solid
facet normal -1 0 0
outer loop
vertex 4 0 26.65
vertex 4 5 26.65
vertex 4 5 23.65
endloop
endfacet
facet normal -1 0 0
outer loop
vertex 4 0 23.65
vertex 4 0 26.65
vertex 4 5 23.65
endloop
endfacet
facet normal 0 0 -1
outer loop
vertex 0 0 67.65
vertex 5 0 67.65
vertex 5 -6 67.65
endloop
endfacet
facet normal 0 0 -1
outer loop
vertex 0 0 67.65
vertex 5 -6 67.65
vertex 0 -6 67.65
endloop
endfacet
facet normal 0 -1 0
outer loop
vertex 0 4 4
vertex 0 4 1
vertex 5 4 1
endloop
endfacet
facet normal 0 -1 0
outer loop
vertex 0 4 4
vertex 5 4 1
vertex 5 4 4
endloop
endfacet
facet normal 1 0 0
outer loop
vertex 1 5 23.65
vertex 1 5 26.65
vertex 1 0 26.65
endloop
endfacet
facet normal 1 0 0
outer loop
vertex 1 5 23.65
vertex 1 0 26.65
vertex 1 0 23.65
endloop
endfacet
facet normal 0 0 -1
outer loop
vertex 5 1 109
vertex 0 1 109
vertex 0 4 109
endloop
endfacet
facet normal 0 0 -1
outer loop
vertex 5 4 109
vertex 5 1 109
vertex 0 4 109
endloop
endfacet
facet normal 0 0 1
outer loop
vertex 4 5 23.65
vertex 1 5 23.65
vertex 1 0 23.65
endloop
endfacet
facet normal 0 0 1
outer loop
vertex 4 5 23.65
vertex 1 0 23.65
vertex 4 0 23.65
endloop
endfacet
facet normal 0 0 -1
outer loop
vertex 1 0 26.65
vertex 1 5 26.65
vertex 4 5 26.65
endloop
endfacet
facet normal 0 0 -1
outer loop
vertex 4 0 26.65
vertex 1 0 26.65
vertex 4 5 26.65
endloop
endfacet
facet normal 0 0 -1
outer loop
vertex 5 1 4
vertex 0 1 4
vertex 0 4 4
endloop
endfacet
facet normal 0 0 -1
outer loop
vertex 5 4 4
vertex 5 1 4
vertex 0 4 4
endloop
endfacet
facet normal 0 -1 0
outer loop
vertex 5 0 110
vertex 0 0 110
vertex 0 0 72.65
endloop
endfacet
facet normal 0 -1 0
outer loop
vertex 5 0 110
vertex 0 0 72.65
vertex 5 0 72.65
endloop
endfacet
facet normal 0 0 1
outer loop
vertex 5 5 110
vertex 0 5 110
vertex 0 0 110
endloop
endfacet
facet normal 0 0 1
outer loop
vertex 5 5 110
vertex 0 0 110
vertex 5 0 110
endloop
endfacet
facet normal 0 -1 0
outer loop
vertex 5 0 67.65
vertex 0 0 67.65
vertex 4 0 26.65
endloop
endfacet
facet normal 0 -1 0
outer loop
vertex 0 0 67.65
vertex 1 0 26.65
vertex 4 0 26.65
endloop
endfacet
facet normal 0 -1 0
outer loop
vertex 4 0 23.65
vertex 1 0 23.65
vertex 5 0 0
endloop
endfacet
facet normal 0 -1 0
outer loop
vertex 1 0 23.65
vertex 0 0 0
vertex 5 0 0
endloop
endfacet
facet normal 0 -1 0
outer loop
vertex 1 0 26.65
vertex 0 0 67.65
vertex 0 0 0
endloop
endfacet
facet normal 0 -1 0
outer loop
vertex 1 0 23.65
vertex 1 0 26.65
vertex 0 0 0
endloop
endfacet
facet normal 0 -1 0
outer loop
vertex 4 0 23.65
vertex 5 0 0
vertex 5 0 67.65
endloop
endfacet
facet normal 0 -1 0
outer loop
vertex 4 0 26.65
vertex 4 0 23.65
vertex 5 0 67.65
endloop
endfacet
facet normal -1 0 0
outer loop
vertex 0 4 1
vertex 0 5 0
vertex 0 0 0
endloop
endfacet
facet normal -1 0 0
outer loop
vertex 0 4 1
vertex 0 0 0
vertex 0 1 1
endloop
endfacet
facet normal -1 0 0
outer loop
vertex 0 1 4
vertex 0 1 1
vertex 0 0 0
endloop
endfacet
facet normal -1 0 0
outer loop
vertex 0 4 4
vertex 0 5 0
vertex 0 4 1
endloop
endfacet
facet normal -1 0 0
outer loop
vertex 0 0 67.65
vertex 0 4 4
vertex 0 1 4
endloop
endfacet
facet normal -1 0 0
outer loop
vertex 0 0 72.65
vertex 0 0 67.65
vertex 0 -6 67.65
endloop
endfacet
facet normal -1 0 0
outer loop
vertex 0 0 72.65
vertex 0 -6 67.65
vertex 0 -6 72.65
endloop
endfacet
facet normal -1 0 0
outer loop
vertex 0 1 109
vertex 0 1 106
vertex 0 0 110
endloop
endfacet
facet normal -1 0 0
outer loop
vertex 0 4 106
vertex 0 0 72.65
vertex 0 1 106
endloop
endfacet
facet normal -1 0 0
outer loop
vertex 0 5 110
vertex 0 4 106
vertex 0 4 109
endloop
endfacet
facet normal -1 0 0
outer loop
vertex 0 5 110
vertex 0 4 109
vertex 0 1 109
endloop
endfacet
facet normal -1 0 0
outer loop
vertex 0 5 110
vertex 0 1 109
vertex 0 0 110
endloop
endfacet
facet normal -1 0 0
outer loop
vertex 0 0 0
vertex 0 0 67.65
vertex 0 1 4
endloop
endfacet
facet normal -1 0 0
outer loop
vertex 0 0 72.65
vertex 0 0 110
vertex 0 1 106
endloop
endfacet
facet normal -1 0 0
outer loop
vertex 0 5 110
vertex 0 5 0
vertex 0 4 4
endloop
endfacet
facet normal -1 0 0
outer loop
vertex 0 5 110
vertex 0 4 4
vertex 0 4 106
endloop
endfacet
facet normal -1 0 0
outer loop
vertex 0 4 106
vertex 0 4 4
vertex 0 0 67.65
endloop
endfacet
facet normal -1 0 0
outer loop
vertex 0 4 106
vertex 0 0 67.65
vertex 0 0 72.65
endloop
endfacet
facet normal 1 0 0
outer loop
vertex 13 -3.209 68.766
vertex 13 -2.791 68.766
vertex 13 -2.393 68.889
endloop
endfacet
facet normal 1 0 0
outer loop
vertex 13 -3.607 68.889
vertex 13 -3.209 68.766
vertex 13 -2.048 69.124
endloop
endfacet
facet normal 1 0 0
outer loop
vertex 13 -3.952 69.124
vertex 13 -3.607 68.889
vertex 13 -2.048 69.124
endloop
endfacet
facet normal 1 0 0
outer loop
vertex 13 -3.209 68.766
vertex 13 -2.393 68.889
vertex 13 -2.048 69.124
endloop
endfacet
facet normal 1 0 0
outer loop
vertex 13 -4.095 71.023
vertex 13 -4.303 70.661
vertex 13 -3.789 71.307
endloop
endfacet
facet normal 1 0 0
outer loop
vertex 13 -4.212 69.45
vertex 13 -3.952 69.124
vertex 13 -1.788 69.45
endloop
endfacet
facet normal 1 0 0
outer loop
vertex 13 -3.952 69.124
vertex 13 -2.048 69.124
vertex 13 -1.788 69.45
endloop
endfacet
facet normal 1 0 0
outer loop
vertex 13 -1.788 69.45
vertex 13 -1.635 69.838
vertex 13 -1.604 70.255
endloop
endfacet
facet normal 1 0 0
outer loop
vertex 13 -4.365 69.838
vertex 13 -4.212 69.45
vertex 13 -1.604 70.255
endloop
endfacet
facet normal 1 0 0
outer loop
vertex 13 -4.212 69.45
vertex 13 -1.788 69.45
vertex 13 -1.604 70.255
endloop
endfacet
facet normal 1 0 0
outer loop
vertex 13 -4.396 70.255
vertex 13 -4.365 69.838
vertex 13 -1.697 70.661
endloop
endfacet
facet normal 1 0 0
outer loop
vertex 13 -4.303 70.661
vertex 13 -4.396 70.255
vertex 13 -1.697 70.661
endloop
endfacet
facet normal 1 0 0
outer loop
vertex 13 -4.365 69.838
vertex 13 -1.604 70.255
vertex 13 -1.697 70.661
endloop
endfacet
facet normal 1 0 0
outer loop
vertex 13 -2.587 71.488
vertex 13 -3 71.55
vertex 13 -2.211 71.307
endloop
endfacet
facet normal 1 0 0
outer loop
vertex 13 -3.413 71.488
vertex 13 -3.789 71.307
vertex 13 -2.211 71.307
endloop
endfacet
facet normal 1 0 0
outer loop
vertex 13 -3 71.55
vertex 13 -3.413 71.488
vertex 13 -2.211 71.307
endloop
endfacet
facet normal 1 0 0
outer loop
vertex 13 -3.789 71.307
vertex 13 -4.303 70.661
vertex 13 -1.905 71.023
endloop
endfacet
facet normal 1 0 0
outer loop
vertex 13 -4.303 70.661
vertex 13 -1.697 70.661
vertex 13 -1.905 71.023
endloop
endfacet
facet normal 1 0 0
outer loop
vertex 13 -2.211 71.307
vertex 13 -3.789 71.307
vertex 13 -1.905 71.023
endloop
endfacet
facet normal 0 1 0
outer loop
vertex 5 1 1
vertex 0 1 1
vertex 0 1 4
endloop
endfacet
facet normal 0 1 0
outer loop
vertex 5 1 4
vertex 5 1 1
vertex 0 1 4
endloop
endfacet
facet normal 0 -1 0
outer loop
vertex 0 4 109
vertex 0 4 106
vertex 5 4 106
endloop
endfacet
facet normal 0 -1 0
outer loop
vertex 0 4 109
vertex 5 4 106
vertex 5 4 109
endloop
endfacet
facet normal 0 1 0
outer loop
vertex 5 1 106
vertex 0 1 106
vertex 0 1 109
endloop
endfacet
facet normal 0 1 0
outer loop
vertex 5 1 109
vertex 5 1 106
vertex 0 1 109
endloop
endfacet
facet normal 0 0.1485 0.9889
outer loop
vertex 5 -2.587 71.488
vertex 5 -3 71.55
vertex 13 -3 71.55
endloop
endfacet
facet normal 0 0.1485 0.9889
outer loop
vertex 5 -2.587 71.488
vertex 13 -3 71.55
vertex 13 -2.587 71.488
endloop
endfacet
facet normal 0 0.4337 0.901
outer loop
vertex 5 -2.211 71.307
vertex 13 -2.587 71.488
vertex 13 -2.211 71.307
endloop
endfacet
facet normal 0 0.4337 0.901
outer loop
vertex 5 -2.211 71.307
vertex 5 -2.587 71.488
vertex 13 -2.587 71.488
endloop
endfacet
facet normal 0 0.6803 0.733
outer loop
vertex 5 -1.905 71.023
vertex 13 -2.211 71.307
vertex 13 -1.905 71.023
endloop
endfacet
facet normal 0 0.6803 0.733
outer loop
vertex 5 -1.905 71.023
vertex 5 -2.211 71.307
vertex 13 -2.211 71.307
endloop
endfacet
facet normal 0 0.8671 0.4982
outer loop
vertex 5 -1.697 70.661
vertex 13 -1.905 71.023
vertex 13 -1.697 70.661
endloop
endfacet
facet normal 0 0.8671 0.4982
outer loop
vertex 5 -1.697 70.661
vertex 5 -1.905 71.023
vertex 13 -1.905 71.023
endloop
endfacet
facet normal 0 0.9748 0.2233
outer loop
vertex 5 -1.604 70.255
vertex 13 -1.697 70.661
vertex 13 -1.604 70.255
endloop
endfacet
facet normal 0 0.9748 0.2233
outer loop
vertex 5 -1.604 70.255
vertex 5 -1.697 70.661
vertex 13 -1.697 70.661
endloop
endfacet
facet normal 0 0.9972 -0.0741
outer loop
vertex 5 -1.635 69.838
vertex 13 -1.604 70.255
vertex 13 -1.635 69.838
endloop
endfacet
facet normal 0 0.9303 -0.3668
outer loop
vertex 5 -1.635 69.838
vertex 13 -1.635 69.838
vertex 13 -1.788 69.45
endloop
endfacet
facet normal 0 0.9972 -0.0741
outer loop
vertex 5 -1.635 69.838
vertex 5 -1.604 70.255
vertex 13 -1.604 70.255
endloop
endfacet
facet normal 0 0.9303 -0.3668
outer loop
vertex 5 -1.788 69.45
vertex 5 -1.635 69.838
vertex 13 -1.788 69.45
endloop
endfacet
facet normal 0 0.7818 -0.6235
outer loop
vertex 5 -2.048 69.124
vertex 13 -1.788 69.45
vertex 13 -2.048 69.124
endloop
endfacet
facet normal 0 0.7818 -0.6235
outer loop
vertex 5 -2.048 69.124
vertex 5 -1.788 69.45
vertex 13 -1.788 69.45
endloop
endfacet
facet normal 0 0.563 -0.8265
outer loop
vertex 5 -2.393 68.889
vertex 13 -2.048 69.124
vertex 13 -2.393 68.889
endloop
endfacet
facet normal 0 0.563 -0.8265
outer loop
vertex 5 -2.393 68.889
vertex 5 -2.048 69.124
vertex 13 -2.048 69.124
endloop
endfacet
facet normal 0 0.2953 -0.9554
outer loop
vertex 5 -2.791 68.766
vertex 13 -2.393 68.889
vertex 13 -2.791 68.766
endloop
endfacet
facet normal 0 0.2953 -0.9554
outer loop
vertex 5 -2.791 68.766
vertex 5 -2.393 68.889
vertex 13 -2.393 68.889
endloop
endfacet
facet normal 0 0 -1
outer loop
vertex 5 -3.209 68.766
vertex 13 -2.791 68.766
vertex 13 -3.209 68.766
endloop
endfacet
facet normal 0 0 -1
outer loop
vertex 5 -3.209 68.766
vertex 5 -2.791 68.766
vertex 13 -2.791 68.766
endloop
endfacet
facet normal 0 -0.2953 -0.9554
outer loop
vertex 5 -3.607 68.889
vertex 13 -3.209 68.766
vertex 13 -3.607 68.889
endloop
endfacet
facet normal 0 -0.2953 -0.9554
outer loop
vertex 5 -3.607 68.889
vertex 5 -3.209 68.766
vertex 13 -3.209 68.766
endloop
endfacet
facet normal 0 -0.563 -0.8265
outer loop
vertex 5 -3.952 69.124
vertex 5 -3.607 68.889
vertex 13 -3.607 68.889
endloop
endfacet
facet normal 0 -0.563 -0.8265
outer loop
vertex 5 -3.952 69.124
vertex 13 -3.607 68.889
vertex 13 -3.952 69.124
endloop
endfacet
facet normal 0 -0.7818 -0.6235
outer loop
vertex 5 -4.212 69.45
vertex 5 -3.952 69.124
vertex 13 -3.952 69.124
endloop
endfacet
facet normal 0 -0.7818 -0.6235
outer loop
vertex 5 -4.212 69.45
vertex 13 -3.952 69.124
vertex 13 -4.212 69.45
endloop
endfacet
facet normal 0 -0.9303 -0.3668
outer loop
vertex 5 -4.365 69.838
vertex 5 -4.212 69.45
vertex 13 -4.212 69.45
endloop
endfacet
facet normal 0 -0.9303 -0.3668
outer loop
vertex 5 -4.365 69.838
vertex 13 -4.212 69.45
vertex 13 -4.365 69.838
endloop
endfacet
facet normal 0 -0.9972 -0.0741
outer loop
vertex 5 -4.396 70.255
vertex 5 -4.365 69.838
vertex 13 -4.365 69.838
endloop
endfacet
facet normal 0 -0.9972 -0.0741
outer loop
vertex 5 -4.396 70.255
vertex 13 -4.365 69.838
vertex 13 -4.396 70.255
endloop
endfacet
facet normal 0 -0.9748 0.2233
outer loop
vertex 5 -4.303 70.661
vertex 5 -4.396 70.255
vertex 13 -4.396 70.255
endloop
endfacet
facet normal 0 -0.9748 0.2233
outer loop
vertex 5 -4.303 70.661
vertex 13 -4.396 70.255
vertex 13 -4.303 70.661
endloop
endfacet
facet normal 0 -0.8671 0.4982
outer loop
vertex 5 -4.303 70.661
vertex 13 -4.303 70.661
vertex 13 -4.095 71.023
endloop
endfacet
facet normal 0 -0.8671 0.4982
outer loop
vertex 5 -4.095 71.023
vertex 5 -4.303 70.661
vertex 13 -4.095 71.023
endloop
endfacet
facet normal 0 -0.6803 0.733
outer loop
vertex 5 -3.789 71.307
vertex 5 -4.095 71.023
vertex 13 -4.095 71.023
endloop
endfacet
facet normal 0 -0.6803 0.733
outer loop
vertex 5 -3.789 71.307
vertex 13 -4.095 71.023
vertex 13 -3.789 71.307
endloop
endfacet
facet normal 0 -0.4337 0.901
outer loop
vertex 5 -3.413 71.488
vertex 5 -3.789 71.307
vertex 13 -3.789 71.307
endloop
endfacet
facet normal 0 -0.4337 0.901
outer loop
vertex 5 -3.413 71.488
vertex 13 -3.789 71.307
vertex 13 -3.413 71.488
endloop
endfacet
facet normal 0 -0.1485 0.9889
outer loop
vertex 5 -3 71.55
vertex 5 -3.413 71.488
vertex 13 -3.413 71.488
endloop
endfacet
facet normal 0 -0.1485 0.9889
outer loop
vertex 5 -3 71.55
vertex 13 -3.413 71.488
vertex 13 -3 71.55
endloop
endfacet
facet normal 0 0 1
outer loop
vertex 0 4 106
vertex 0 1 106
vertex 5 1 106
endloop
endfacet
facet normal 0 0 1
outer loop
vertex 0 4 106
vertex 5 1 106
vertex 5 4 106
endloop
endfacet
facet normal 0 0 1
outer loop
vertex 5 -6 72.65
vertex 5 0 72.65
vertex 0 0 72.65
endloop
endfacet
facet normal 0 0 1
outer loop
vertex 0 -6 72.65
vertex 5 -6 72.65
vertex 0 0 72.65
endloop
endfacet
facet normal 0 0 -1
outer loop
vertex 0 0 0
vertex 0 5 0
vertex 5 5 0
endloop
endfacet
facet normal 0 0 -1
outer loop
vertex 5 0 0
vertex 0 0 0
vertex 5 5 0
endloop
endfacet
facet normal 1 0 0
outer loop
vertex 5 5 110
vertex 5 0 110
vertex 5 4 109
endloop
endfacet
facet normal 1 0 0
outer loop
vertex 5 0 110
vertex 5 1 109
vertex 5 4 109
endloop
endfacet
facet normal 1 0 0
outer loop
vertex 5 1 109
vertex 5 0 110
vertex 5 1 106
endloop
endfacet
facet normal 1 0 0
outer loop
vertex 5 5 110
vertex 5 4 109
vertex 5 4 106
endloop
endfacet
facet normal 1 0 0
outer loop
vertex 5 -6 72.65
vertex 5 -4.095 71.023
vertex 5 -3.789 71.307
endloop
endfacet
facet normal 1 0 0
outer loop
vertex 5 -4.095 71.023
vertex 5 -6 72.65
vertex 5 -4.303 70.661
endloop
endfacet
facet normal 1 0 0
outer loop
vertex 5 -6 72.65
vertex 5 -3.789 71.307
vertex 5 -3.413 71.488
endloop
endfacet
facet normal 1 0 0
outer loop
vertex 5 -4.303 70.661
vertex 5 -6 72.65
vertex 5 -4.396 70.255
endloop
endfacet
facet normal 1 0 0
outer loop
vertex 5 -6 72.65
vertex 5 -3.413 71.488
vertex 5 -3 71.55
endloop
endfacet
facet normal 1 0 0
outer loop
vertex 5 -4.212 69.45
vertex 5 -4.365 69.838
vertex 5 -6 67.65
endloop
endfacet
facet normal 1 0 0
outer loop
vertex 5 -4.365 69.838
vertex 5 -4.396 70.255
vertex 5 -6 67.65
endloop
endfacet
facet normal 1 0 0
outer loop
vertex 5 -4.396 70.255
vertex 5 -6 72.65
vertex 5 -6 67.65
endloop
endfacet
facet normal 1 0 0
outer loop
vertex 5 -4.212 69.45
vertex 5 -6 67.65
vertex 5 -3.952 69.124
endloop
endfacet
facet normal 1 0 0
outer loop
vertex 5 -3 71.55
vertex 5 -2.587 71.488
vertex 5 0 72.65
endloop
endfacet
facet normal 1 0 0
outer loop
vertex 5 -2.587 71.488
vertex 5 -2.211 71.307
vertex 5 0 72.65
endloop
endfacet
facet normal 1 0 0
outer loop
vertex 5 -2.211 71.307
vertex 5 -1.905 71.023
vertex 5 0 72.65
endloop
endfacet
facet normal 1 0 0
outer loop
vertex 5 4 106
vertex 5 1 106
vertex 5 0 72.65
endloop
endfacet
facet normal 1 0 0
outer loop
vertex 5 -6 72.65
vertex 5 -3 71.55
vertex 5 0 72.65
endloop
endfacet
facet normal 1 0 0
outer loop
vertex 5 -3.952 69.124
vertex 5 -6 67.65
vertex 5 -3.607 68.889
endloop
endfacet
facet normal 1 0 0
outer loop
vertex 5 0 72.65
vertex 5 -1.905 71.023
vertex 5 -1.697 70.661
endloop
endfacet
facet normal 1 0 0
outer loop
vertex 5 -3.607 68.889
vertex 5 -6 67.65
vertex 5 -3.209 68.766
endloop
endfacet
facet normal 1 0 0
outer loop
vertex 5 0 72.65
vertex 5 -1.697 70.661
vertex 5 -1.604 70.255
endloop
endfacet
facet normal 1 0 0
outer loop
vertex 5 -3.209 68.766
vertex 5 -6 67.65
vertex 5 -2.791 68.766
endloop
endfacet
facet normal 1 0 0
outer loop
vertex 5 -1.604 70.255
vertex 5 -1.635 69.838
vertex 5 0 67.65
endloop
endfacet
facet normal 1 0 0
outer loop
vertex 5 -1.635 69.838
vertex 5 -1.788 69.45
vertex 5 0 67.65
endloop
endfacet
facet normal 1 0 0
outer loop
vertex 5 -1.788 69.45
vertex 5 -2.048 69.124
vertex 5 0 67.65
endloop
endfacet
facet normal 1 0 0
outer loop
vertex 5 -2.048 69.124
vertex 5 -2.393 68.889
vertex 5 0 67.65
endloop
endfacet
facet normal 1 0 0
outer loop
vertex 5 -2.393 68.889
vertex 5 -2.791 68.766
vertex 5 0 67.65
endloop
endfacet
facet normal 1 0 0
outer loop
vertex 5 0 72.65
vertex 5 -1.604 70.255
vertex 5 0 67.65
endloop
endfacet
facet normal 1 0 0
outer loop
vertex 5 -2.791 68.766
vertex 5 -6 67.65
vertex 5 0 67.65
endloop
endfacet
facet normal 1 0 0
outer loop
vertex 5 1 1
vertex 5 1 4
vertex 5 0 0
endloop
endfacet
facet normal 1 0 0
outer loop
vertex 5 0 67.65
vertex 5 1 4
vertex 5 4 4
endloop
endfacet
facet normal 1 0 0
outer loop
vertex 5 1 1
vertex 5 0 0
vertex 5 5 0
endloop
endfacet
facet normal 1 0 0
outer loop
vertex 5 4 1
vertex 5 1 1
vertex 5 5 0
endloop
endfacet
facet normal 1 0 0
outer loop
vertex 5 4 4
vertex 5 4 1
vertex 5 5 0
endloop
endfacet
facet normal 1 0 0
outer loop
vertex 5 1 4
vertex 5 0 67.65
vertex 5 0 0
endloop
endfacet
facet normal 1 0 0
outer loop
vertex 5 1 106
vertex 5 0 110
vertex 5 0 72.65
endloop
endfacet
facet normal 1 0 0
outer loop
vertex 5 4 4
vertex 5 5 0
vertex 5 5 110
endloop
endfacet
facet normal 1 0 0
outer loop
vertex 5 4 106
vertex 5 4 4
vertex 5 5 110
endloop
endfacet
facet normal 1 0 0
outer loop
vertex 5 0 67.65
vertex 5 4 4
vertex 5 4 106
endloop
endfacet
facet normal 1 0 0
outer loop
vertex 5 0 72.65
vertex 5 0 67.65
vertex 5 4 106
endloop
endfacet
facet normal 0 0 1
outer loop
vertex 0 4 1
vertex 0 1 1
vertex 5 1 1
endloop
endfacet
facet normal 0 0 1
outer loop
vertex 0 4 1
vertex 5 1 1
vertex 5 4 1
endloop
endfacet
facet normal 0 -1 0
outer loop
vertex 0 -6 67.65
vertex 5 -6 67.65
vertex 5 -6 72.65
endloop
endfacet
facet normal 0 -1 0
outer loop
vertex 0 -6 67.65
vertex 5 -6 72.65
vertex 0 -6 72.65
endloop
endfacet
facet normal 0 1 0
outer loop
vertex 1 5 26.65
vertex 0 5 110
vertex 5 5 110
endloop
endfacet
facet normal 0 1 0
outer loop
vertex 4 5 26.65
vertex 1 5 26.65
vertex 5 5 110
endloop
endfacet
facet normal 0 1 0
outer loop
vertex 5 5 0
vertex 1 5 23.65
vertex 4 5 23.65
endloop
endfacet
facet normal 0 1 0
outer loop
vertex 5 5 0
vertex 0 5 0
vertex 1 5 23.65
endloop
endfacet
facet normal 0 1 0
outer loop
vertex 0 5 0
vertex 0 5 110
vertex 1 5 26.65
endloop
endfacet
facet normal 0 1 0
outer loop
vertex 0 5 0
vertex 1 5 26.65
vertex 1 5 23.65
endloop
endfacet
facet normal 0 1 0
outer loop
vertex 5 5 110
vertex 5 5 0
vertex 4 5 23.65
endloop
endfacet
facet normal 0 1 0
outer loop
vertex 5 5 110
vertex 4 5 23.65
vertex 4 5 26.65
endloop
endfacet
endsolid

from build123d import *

# Parameters (mm, degrees)
SKETCH1_W           = 5
SKETCH1_H           = 5
BOSS_EXTRUDE1_DEPTH = 110
SKETCH2_W           = 3
SKETCH2_H           = 3
CUT_EXTRUDE1_DEPTH  = 9
SKETCH3_W           = 3
SKETCH3_H           = 3
CUT_EXTRUDE2_DEPTH  = 9
SKETCH4_W           = 5
SKETCH4_H           = 5
BOSS_EXTRUDE2_DEPTH = 6
SKETCH5_R           = 1.4
BOSS_EXTRUDE3_DEPTH = 13


with BuildPart() as part:
    # Sketch1 → Boss-Extrude1 (new body)
    with BuildSketch(Plane.XY):
        with Locations((2.5, 2.5)):
            Rectangle(SKETCH1_W, SKETCH1_H)
    extrude(amount=BOSS_EXTRUDE1_DEPTH)

    # Sketch2 → Cut-Extrude1 (cut)
    with BuildSketch(Plane.ZY):
        with Locations((2.5, 2.5)):
            Rectangle(SKETCH2_W, SKETCH2_H)
        with Locations((107.5, 2.5)):
            Rectangle(SKETCH2_W, SKETCH2_H)
    extrude(amount=-CUT_EXTRUDE1_DEPTH, mode=Mode.SUBTRACT)

    # Sketch3 → Cut-Extrude2 (cut)
    with BuildSketch(Plane(origin=(0, 5, 0), x_dir=(1, 0, 0), z_dir=(0, 1, 0))):
        with Locations((2.5, -25.15)):
            Rectangle(SKETCH3_W, SKETCH3_H)
    extrude(amount=-CUT_EXTRUDE2_DEPTH, mode=Mode.SUBTRACT)

    # Sketch4 → Boss-Extrude2 (add)
    with BuildSketch(Plane(origin=(0, 0, 0), x_dir=(-1, 0, 0), z_dir=(0, -1, 0))):
        with Locations((-2.5, -70.15)):
            Rectangle(SKETCH4_W, SKETCH4_H)
    extrude(amount=BOSS_EXTRUDE2_DEPTH)

    # Sketch5 → Boss-Extrude3 (add)
    with BuildSketch(Plane.ZY):
        with Locations((70.15, -3)):
            Circle(SKETCH5_R)
    extrude(amount=-BOSS_EXTRUDE3_DEPTH)


solid = part.part
